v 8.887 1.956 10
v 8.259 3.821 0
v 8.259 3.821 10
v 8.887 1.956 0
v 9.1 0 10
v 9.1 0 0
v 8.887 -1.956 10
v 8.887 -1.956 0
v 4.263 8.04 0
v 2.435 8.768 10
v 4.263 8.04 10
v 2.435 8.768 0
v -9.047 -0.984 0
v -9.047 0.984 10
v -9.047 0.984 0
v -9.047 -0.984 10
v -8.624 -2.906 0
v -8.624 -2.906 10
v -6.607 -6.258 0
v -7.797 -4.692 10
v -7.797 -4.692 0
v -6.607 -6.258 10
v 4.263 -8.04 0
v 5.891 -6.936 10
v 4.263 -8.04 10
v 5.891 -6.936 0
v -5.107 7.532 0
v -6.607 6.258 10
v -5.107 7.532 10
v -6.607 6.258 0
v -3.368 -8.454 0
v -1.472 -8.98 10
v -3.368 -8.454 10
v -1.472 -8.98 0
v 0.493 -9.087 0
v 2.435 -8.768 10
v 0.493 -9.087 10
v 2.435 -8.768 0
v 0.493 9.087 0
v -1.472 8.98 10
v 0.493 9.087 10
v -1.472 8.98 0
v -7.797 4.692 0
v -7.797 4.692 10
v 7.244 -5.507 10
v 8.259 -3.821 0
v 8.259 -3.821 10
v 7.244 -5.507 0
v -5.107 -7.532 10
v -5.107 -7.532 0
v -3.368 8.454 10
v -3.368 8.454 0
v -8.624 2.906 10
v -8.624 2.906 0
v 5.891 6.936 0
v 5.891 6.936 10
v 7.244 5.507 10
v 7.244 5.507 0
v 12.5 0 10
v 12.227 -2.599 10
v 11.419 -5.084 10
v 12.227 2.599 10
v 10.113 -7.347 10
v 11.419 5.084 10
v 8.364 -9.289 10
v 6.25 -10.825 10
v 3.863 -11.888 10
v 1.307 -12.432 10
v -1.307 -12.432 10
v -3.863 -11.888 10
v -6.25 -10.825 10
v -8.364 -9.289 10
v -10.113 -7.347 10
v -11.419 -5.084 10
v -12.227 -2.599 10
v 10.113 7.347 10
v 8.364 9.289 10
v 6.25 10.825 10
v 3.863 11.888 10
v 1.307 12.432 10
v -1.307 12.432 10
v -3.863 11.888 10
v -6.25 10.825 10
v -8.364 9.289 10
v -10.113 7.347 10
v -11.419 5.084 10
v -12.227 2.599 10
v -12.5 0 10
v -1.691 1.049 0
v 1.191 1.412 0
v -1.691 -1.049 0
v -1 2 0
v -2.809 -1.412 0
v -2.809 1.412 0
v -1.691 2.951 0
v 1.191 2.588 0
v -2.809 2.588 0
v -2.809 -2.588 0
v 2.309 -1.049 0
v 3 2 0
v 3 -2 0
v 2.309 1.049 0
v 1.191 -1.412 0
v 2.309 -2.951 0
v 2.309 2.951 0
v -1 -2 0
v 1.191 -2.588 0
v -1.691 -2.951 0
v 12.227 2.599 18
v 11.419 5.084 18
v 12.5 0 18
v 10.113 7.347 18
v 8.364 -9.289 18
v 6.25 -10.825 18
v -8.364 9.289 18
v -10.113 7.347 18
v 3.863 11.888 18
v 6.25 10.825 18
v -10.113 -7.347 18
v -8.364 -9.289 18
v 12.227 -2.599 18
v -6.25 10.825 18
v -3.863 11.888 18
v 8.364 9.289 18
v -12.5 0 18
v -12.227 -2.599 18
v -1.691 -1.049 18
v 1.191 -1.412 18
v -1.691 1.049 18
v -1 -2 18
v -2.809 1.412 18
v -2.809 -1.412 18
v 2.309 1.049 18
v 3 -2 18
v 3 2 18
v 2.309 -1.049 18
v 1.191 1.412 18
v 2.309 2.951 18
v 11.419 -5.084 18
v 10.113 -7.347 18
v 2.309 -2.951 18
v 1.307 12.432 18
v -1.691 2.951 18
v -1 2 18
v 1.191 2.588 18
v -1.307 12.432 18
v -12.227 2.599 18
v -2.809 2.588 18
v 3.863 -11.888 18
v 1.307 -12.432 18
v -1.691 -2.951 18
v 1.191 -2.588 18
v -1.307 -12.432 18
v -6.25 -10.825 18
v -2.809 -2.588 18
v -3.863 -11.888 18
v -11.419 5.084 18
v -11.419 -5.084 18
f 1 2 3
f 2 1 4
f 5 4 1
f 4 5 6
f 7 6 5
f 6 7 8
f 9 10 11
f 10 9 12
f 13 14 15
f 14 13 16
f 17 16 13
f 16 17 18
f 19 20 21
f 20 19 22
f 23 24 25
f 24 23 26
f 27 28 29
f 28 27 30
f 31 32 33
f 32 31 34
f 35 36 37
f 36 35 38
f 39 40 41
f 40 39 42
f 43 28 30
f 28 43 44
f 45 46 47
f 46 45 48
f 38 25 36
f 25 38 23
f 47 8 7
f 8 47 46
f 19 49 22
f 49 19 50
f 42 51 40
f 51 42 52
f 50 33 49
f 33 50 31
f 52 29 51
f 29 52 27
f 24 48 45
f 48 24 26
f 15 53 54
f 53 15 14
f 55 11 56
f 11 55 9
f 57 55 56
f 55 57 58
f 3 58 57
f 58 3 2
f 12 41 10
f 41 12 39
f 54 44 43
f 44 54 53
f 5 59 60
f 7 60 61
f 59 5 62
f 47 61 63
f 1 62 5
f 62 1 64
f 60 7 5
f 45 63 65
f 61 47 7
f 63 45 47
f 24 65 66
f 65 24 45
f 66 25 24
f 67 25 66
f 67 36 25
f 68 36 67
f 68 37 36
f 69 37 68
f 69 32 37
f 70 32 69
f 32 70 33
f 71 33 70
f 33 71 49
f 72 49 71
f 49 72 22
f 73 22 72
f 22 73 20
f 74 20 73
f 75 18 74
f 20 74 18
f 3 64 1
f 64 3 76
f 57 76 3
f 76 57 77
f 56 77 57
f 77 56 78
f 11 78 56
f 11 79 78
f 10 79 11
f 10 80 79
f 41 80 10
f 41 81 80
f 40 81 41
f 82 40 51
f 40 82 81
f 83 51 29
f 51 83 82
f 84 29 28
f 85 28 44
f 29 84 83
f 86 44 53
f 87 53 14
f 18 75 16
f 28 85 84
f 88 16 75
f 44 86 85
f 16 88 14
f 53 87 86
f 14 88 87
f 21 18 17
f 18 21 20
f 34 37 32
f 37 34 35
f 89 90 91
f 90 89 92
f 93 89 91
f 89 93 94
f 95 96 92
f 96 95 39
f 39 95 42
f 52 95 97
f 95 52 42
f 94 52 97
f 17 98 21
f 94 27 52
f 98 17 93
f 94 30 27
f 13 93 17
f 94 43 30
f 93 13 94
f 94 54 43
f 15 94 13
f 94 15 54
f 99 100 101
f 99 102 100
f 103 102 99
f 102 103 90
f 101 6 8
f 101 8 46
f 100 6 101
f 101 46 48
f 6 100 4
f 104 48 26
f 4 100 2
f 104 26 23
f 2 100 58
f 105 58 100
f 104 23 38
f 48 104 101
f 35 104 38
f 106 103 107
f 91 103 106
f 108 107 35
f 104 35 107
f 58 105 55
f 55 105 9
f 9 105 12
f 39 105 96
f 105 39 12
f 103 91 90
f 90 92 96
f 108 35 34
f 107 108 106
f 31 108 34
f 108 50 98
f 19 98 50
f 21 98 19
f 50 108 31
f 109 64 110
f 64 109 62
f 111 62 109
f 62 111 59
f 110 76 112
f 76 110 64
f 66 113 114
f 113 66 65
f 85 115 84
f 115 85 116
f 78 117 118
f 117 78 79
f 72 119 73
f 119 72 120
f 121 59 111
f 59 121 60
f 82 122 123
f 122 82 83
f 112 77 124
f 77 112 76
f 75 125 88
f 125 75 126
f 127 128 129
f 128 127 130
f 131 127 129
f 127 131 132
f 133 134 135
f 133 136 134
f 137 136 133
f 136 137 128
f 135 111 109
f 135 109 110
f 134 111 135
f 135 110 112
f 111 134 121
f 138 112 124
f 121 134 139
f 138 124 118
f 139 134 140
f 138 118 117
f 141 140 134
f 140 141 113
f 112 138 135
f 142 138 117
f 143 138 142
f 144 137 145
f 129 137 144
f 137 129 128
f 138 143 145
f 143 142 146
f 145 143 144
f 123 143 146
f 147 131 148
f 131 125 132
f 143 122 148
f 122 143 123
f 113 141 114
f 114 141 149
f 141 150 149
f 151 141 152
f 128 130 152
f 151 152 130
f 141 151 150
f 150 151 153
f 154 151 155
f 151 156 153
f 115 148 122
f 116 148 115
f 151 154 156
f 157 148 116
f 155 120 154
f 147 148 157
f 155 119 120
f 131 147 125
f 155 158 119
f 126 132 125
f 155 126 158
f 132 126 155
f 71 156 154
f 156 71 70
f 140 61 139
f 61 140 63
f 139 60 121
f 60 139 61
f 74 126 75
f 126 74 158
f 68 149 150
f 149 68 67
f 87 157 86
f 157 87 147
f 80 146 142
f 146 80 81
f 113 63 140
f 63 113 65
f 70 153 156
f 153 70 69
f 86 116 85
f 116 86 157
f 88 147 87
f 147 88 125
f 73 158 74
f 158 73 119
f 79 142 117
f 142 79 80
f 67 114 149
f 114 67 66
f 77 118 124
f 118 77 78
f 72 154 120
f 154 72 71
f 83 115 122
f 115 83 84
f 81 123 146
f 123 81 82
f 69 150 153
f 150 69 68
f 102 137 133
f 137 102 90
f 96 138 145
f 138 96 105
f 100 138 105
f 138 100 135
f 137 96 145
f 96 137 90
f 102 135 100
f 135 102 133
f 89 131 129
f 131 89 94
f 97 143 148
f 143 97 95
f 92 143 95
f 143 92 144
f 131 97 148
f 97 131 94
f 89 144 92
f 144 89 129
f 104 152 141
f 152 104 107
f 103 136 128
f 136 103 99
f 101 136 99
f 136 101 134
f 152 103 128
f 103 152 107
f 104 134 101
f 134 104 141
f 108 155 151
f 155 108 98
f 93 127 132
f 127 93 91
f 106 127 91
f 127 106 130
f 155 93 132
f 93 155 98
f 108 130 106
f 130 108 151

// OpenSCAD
difference(){
    union(){
        cylinder(h=10, d=18.2);
        translate([0,0,10])
            cylinder(h=8, d=25);
        
    }
    translate([2,2,0])
        cylinder(h=20, d=2);
    translate([-2,2,0])
        cylinder(h=20, d=2);
    translate([2,-2,0])
        cylinder(h=20, d=2);
    translate([-2,-2,0])
        cylinder(h=20, d=2);
}
